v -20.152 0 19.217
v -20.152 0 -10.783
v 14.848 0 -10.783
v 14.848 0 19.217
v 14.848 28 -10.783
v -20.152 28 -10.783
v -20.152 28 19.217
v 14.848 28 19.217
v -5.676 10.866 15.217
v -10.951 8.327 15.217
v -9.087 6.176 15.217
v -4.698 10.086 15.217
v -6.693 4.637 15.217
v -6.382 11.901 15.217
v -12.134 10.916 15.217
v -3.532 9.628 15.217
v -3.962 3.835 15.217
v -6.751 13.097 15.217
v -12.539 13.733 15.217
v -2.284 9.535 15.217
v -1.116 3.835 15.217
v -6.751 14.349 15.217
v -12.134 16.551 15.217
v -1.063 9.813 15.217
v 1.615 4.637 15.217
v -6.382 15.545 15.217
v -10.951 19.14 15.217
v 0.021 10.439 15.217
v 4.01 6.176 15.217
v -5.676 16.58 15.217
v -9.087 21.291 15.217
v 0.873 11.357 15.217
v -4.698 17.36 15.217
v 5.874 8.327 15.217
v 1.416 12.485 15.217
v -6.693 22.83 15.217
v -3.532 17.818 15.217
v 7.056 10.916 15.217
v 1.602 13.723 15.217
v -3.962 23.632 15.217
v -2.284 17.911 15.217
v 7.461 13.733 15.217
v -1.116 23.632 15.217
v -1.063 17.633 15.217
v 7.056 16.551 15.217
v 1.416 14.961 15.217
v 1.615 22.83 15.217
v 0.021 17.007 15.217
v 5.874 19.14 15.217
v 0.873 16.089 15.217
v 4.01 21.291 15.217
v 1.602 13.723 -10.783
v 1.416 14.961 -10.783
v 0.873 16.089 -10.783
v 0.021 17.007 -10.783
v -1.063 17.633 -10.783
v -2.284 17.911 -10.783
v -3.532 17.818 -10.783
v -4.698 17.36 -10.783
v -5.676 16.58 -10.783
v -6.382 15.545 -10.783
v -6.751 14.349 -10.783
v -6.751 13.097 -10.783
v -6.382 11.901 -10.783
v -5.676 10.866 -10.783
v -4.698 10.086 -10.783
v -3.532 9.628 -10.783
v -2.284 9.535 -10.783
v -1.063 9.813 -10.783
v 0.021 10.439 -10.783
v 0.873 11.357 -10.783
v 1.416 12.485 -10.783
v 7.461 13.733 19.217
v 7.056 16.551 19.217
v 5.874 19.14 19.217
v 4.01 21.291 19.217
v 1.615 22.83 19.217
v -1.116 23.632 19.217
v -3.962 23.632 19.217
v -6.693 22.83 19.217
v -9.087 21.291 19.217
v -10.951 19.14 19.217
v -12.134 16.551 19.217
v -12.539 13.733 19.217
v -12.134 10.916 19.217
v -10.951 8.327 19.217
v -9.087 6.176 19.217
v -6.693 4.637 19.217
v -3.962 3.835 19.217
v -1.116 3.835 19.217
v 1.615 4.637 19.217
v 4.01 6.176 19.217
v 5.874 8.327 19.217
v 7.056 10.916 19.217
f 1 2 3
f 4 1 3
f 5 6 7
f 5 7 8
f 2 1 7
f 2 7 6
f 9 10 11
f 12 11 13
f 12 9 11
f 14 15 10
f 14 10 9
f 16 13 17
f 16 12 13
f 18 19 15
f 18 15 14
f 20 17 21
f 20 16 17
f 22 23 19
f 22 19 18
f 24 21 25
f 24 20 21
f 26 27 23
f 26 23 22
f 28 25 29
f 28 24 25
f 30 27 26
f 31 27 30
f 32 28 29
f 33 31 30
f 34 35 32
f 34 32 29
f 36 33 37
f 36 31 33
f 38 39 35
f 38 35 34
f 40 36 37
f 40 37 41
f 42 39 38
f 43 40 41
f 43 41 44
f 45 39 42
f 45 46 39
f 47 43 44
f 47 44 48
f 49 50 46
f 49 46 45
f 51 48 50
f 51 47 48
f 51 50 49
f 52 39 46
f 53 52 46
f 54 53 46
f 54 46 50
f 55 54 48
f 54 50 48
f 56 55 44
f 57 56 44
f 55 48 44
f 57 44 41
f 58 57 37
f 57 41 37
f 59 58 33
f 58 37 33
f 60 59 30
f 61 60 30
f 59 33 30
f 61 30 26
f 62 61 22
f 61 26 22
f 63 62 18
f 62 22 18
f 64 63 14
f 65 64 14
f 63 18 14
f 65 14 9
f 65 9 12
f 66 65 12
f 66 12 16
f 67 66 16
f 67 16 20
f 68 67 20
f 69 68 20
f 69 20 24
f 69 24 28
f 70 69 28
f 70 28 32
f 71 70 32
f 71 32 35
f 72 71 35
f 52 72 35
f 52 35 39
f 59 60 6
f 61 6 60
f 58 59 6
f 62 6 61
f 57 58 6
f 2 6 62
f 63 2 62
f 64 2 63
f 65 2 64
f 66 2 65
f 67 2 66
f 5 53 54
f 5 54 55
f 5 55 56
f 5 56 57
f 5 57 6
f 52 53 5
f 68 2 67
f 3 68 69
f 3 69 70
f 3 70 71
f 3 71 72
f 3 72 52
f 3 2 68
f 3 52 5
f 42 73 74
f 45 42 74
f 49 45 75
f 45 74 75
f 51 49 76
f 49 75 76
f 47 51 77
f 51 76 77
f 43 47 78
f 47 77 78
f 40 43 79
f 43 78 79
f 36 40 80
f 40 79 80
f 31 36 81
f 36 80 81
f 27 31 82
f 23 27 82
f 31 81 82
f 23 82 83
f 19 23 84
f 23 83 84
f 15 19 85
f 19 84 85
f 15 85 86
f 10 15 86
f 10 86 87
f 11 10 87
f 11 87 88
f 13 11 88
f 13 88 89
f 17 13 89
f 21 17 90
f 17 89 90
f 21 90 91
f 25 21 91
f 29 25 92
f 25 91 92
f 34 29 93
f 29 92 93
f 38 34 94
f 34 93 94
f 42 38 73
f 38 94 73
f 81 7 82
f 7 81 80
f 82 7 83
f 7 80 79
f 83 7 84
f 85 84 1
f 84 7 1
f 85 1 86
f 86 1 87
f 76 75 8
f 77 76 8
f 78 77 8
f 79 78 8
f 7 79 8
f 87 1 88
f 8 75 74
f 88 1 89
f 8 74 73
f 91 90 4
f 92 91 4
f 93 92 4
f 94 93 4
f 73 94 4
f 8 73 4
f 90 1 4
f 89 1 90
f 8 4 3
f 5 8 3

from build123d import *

# Parameters (mm, degrees)
SKETCH1_W           = 35
SKETCH1_H           = 30
BOSS_EXTRUDE1_DEPTH = 28
SKETCH2_R           = 10
SKETCH2_R_2         = 4
CUT_EXTRUDE1_DEPTH  = 4
SKETCH4_R           = 4.2
CUT_EXTRUDE2_DEPTH  = 48


with BuildPart() as part:
    # Sketch1 → Boss-Extrude1 (new body)
    with BuildSketch(Plane(origin=(0, 0, 0), x_dir=(1, 0, 0), z_dir=(0, 1, 0))):
        with Locations((-2.651515152, -4.217171717)):
            Rectangle(SKETCH1_W, SKETCH1_H)
    extrude(amount=BOSS_EXTRUDE1_DEPTH)

    # Sketch2 → Cut-Extrude1 (cut)
    with BuildSketch(Plane.XY.offset(19.217171717)):
        with Locations((-2.538807386, 13.733372101)):
            Circle(SKETCH2_R)
        with Locations((-2.538807386, 13.733372101)):
            Circle(SKETCH2_R_2, mode=Mode.SUBTRACT)
    extrude(amount=-CUT_EXTRUDE1_DEPTH, mode=Mode.SUBTRACT)

    # Sketch4 → Cut-Extrude2 (cut)
    with BuildSketch(Plane.XY.offset(19.217171717)):
        with Locations((-2.597602696, 13.723084653)):
            Circle(SKETCH4_R)
    extrude(amount=-CUT_EXTRUDE2_DEPTH, mode=Mode.SUBTRACT)


solid = part.part
